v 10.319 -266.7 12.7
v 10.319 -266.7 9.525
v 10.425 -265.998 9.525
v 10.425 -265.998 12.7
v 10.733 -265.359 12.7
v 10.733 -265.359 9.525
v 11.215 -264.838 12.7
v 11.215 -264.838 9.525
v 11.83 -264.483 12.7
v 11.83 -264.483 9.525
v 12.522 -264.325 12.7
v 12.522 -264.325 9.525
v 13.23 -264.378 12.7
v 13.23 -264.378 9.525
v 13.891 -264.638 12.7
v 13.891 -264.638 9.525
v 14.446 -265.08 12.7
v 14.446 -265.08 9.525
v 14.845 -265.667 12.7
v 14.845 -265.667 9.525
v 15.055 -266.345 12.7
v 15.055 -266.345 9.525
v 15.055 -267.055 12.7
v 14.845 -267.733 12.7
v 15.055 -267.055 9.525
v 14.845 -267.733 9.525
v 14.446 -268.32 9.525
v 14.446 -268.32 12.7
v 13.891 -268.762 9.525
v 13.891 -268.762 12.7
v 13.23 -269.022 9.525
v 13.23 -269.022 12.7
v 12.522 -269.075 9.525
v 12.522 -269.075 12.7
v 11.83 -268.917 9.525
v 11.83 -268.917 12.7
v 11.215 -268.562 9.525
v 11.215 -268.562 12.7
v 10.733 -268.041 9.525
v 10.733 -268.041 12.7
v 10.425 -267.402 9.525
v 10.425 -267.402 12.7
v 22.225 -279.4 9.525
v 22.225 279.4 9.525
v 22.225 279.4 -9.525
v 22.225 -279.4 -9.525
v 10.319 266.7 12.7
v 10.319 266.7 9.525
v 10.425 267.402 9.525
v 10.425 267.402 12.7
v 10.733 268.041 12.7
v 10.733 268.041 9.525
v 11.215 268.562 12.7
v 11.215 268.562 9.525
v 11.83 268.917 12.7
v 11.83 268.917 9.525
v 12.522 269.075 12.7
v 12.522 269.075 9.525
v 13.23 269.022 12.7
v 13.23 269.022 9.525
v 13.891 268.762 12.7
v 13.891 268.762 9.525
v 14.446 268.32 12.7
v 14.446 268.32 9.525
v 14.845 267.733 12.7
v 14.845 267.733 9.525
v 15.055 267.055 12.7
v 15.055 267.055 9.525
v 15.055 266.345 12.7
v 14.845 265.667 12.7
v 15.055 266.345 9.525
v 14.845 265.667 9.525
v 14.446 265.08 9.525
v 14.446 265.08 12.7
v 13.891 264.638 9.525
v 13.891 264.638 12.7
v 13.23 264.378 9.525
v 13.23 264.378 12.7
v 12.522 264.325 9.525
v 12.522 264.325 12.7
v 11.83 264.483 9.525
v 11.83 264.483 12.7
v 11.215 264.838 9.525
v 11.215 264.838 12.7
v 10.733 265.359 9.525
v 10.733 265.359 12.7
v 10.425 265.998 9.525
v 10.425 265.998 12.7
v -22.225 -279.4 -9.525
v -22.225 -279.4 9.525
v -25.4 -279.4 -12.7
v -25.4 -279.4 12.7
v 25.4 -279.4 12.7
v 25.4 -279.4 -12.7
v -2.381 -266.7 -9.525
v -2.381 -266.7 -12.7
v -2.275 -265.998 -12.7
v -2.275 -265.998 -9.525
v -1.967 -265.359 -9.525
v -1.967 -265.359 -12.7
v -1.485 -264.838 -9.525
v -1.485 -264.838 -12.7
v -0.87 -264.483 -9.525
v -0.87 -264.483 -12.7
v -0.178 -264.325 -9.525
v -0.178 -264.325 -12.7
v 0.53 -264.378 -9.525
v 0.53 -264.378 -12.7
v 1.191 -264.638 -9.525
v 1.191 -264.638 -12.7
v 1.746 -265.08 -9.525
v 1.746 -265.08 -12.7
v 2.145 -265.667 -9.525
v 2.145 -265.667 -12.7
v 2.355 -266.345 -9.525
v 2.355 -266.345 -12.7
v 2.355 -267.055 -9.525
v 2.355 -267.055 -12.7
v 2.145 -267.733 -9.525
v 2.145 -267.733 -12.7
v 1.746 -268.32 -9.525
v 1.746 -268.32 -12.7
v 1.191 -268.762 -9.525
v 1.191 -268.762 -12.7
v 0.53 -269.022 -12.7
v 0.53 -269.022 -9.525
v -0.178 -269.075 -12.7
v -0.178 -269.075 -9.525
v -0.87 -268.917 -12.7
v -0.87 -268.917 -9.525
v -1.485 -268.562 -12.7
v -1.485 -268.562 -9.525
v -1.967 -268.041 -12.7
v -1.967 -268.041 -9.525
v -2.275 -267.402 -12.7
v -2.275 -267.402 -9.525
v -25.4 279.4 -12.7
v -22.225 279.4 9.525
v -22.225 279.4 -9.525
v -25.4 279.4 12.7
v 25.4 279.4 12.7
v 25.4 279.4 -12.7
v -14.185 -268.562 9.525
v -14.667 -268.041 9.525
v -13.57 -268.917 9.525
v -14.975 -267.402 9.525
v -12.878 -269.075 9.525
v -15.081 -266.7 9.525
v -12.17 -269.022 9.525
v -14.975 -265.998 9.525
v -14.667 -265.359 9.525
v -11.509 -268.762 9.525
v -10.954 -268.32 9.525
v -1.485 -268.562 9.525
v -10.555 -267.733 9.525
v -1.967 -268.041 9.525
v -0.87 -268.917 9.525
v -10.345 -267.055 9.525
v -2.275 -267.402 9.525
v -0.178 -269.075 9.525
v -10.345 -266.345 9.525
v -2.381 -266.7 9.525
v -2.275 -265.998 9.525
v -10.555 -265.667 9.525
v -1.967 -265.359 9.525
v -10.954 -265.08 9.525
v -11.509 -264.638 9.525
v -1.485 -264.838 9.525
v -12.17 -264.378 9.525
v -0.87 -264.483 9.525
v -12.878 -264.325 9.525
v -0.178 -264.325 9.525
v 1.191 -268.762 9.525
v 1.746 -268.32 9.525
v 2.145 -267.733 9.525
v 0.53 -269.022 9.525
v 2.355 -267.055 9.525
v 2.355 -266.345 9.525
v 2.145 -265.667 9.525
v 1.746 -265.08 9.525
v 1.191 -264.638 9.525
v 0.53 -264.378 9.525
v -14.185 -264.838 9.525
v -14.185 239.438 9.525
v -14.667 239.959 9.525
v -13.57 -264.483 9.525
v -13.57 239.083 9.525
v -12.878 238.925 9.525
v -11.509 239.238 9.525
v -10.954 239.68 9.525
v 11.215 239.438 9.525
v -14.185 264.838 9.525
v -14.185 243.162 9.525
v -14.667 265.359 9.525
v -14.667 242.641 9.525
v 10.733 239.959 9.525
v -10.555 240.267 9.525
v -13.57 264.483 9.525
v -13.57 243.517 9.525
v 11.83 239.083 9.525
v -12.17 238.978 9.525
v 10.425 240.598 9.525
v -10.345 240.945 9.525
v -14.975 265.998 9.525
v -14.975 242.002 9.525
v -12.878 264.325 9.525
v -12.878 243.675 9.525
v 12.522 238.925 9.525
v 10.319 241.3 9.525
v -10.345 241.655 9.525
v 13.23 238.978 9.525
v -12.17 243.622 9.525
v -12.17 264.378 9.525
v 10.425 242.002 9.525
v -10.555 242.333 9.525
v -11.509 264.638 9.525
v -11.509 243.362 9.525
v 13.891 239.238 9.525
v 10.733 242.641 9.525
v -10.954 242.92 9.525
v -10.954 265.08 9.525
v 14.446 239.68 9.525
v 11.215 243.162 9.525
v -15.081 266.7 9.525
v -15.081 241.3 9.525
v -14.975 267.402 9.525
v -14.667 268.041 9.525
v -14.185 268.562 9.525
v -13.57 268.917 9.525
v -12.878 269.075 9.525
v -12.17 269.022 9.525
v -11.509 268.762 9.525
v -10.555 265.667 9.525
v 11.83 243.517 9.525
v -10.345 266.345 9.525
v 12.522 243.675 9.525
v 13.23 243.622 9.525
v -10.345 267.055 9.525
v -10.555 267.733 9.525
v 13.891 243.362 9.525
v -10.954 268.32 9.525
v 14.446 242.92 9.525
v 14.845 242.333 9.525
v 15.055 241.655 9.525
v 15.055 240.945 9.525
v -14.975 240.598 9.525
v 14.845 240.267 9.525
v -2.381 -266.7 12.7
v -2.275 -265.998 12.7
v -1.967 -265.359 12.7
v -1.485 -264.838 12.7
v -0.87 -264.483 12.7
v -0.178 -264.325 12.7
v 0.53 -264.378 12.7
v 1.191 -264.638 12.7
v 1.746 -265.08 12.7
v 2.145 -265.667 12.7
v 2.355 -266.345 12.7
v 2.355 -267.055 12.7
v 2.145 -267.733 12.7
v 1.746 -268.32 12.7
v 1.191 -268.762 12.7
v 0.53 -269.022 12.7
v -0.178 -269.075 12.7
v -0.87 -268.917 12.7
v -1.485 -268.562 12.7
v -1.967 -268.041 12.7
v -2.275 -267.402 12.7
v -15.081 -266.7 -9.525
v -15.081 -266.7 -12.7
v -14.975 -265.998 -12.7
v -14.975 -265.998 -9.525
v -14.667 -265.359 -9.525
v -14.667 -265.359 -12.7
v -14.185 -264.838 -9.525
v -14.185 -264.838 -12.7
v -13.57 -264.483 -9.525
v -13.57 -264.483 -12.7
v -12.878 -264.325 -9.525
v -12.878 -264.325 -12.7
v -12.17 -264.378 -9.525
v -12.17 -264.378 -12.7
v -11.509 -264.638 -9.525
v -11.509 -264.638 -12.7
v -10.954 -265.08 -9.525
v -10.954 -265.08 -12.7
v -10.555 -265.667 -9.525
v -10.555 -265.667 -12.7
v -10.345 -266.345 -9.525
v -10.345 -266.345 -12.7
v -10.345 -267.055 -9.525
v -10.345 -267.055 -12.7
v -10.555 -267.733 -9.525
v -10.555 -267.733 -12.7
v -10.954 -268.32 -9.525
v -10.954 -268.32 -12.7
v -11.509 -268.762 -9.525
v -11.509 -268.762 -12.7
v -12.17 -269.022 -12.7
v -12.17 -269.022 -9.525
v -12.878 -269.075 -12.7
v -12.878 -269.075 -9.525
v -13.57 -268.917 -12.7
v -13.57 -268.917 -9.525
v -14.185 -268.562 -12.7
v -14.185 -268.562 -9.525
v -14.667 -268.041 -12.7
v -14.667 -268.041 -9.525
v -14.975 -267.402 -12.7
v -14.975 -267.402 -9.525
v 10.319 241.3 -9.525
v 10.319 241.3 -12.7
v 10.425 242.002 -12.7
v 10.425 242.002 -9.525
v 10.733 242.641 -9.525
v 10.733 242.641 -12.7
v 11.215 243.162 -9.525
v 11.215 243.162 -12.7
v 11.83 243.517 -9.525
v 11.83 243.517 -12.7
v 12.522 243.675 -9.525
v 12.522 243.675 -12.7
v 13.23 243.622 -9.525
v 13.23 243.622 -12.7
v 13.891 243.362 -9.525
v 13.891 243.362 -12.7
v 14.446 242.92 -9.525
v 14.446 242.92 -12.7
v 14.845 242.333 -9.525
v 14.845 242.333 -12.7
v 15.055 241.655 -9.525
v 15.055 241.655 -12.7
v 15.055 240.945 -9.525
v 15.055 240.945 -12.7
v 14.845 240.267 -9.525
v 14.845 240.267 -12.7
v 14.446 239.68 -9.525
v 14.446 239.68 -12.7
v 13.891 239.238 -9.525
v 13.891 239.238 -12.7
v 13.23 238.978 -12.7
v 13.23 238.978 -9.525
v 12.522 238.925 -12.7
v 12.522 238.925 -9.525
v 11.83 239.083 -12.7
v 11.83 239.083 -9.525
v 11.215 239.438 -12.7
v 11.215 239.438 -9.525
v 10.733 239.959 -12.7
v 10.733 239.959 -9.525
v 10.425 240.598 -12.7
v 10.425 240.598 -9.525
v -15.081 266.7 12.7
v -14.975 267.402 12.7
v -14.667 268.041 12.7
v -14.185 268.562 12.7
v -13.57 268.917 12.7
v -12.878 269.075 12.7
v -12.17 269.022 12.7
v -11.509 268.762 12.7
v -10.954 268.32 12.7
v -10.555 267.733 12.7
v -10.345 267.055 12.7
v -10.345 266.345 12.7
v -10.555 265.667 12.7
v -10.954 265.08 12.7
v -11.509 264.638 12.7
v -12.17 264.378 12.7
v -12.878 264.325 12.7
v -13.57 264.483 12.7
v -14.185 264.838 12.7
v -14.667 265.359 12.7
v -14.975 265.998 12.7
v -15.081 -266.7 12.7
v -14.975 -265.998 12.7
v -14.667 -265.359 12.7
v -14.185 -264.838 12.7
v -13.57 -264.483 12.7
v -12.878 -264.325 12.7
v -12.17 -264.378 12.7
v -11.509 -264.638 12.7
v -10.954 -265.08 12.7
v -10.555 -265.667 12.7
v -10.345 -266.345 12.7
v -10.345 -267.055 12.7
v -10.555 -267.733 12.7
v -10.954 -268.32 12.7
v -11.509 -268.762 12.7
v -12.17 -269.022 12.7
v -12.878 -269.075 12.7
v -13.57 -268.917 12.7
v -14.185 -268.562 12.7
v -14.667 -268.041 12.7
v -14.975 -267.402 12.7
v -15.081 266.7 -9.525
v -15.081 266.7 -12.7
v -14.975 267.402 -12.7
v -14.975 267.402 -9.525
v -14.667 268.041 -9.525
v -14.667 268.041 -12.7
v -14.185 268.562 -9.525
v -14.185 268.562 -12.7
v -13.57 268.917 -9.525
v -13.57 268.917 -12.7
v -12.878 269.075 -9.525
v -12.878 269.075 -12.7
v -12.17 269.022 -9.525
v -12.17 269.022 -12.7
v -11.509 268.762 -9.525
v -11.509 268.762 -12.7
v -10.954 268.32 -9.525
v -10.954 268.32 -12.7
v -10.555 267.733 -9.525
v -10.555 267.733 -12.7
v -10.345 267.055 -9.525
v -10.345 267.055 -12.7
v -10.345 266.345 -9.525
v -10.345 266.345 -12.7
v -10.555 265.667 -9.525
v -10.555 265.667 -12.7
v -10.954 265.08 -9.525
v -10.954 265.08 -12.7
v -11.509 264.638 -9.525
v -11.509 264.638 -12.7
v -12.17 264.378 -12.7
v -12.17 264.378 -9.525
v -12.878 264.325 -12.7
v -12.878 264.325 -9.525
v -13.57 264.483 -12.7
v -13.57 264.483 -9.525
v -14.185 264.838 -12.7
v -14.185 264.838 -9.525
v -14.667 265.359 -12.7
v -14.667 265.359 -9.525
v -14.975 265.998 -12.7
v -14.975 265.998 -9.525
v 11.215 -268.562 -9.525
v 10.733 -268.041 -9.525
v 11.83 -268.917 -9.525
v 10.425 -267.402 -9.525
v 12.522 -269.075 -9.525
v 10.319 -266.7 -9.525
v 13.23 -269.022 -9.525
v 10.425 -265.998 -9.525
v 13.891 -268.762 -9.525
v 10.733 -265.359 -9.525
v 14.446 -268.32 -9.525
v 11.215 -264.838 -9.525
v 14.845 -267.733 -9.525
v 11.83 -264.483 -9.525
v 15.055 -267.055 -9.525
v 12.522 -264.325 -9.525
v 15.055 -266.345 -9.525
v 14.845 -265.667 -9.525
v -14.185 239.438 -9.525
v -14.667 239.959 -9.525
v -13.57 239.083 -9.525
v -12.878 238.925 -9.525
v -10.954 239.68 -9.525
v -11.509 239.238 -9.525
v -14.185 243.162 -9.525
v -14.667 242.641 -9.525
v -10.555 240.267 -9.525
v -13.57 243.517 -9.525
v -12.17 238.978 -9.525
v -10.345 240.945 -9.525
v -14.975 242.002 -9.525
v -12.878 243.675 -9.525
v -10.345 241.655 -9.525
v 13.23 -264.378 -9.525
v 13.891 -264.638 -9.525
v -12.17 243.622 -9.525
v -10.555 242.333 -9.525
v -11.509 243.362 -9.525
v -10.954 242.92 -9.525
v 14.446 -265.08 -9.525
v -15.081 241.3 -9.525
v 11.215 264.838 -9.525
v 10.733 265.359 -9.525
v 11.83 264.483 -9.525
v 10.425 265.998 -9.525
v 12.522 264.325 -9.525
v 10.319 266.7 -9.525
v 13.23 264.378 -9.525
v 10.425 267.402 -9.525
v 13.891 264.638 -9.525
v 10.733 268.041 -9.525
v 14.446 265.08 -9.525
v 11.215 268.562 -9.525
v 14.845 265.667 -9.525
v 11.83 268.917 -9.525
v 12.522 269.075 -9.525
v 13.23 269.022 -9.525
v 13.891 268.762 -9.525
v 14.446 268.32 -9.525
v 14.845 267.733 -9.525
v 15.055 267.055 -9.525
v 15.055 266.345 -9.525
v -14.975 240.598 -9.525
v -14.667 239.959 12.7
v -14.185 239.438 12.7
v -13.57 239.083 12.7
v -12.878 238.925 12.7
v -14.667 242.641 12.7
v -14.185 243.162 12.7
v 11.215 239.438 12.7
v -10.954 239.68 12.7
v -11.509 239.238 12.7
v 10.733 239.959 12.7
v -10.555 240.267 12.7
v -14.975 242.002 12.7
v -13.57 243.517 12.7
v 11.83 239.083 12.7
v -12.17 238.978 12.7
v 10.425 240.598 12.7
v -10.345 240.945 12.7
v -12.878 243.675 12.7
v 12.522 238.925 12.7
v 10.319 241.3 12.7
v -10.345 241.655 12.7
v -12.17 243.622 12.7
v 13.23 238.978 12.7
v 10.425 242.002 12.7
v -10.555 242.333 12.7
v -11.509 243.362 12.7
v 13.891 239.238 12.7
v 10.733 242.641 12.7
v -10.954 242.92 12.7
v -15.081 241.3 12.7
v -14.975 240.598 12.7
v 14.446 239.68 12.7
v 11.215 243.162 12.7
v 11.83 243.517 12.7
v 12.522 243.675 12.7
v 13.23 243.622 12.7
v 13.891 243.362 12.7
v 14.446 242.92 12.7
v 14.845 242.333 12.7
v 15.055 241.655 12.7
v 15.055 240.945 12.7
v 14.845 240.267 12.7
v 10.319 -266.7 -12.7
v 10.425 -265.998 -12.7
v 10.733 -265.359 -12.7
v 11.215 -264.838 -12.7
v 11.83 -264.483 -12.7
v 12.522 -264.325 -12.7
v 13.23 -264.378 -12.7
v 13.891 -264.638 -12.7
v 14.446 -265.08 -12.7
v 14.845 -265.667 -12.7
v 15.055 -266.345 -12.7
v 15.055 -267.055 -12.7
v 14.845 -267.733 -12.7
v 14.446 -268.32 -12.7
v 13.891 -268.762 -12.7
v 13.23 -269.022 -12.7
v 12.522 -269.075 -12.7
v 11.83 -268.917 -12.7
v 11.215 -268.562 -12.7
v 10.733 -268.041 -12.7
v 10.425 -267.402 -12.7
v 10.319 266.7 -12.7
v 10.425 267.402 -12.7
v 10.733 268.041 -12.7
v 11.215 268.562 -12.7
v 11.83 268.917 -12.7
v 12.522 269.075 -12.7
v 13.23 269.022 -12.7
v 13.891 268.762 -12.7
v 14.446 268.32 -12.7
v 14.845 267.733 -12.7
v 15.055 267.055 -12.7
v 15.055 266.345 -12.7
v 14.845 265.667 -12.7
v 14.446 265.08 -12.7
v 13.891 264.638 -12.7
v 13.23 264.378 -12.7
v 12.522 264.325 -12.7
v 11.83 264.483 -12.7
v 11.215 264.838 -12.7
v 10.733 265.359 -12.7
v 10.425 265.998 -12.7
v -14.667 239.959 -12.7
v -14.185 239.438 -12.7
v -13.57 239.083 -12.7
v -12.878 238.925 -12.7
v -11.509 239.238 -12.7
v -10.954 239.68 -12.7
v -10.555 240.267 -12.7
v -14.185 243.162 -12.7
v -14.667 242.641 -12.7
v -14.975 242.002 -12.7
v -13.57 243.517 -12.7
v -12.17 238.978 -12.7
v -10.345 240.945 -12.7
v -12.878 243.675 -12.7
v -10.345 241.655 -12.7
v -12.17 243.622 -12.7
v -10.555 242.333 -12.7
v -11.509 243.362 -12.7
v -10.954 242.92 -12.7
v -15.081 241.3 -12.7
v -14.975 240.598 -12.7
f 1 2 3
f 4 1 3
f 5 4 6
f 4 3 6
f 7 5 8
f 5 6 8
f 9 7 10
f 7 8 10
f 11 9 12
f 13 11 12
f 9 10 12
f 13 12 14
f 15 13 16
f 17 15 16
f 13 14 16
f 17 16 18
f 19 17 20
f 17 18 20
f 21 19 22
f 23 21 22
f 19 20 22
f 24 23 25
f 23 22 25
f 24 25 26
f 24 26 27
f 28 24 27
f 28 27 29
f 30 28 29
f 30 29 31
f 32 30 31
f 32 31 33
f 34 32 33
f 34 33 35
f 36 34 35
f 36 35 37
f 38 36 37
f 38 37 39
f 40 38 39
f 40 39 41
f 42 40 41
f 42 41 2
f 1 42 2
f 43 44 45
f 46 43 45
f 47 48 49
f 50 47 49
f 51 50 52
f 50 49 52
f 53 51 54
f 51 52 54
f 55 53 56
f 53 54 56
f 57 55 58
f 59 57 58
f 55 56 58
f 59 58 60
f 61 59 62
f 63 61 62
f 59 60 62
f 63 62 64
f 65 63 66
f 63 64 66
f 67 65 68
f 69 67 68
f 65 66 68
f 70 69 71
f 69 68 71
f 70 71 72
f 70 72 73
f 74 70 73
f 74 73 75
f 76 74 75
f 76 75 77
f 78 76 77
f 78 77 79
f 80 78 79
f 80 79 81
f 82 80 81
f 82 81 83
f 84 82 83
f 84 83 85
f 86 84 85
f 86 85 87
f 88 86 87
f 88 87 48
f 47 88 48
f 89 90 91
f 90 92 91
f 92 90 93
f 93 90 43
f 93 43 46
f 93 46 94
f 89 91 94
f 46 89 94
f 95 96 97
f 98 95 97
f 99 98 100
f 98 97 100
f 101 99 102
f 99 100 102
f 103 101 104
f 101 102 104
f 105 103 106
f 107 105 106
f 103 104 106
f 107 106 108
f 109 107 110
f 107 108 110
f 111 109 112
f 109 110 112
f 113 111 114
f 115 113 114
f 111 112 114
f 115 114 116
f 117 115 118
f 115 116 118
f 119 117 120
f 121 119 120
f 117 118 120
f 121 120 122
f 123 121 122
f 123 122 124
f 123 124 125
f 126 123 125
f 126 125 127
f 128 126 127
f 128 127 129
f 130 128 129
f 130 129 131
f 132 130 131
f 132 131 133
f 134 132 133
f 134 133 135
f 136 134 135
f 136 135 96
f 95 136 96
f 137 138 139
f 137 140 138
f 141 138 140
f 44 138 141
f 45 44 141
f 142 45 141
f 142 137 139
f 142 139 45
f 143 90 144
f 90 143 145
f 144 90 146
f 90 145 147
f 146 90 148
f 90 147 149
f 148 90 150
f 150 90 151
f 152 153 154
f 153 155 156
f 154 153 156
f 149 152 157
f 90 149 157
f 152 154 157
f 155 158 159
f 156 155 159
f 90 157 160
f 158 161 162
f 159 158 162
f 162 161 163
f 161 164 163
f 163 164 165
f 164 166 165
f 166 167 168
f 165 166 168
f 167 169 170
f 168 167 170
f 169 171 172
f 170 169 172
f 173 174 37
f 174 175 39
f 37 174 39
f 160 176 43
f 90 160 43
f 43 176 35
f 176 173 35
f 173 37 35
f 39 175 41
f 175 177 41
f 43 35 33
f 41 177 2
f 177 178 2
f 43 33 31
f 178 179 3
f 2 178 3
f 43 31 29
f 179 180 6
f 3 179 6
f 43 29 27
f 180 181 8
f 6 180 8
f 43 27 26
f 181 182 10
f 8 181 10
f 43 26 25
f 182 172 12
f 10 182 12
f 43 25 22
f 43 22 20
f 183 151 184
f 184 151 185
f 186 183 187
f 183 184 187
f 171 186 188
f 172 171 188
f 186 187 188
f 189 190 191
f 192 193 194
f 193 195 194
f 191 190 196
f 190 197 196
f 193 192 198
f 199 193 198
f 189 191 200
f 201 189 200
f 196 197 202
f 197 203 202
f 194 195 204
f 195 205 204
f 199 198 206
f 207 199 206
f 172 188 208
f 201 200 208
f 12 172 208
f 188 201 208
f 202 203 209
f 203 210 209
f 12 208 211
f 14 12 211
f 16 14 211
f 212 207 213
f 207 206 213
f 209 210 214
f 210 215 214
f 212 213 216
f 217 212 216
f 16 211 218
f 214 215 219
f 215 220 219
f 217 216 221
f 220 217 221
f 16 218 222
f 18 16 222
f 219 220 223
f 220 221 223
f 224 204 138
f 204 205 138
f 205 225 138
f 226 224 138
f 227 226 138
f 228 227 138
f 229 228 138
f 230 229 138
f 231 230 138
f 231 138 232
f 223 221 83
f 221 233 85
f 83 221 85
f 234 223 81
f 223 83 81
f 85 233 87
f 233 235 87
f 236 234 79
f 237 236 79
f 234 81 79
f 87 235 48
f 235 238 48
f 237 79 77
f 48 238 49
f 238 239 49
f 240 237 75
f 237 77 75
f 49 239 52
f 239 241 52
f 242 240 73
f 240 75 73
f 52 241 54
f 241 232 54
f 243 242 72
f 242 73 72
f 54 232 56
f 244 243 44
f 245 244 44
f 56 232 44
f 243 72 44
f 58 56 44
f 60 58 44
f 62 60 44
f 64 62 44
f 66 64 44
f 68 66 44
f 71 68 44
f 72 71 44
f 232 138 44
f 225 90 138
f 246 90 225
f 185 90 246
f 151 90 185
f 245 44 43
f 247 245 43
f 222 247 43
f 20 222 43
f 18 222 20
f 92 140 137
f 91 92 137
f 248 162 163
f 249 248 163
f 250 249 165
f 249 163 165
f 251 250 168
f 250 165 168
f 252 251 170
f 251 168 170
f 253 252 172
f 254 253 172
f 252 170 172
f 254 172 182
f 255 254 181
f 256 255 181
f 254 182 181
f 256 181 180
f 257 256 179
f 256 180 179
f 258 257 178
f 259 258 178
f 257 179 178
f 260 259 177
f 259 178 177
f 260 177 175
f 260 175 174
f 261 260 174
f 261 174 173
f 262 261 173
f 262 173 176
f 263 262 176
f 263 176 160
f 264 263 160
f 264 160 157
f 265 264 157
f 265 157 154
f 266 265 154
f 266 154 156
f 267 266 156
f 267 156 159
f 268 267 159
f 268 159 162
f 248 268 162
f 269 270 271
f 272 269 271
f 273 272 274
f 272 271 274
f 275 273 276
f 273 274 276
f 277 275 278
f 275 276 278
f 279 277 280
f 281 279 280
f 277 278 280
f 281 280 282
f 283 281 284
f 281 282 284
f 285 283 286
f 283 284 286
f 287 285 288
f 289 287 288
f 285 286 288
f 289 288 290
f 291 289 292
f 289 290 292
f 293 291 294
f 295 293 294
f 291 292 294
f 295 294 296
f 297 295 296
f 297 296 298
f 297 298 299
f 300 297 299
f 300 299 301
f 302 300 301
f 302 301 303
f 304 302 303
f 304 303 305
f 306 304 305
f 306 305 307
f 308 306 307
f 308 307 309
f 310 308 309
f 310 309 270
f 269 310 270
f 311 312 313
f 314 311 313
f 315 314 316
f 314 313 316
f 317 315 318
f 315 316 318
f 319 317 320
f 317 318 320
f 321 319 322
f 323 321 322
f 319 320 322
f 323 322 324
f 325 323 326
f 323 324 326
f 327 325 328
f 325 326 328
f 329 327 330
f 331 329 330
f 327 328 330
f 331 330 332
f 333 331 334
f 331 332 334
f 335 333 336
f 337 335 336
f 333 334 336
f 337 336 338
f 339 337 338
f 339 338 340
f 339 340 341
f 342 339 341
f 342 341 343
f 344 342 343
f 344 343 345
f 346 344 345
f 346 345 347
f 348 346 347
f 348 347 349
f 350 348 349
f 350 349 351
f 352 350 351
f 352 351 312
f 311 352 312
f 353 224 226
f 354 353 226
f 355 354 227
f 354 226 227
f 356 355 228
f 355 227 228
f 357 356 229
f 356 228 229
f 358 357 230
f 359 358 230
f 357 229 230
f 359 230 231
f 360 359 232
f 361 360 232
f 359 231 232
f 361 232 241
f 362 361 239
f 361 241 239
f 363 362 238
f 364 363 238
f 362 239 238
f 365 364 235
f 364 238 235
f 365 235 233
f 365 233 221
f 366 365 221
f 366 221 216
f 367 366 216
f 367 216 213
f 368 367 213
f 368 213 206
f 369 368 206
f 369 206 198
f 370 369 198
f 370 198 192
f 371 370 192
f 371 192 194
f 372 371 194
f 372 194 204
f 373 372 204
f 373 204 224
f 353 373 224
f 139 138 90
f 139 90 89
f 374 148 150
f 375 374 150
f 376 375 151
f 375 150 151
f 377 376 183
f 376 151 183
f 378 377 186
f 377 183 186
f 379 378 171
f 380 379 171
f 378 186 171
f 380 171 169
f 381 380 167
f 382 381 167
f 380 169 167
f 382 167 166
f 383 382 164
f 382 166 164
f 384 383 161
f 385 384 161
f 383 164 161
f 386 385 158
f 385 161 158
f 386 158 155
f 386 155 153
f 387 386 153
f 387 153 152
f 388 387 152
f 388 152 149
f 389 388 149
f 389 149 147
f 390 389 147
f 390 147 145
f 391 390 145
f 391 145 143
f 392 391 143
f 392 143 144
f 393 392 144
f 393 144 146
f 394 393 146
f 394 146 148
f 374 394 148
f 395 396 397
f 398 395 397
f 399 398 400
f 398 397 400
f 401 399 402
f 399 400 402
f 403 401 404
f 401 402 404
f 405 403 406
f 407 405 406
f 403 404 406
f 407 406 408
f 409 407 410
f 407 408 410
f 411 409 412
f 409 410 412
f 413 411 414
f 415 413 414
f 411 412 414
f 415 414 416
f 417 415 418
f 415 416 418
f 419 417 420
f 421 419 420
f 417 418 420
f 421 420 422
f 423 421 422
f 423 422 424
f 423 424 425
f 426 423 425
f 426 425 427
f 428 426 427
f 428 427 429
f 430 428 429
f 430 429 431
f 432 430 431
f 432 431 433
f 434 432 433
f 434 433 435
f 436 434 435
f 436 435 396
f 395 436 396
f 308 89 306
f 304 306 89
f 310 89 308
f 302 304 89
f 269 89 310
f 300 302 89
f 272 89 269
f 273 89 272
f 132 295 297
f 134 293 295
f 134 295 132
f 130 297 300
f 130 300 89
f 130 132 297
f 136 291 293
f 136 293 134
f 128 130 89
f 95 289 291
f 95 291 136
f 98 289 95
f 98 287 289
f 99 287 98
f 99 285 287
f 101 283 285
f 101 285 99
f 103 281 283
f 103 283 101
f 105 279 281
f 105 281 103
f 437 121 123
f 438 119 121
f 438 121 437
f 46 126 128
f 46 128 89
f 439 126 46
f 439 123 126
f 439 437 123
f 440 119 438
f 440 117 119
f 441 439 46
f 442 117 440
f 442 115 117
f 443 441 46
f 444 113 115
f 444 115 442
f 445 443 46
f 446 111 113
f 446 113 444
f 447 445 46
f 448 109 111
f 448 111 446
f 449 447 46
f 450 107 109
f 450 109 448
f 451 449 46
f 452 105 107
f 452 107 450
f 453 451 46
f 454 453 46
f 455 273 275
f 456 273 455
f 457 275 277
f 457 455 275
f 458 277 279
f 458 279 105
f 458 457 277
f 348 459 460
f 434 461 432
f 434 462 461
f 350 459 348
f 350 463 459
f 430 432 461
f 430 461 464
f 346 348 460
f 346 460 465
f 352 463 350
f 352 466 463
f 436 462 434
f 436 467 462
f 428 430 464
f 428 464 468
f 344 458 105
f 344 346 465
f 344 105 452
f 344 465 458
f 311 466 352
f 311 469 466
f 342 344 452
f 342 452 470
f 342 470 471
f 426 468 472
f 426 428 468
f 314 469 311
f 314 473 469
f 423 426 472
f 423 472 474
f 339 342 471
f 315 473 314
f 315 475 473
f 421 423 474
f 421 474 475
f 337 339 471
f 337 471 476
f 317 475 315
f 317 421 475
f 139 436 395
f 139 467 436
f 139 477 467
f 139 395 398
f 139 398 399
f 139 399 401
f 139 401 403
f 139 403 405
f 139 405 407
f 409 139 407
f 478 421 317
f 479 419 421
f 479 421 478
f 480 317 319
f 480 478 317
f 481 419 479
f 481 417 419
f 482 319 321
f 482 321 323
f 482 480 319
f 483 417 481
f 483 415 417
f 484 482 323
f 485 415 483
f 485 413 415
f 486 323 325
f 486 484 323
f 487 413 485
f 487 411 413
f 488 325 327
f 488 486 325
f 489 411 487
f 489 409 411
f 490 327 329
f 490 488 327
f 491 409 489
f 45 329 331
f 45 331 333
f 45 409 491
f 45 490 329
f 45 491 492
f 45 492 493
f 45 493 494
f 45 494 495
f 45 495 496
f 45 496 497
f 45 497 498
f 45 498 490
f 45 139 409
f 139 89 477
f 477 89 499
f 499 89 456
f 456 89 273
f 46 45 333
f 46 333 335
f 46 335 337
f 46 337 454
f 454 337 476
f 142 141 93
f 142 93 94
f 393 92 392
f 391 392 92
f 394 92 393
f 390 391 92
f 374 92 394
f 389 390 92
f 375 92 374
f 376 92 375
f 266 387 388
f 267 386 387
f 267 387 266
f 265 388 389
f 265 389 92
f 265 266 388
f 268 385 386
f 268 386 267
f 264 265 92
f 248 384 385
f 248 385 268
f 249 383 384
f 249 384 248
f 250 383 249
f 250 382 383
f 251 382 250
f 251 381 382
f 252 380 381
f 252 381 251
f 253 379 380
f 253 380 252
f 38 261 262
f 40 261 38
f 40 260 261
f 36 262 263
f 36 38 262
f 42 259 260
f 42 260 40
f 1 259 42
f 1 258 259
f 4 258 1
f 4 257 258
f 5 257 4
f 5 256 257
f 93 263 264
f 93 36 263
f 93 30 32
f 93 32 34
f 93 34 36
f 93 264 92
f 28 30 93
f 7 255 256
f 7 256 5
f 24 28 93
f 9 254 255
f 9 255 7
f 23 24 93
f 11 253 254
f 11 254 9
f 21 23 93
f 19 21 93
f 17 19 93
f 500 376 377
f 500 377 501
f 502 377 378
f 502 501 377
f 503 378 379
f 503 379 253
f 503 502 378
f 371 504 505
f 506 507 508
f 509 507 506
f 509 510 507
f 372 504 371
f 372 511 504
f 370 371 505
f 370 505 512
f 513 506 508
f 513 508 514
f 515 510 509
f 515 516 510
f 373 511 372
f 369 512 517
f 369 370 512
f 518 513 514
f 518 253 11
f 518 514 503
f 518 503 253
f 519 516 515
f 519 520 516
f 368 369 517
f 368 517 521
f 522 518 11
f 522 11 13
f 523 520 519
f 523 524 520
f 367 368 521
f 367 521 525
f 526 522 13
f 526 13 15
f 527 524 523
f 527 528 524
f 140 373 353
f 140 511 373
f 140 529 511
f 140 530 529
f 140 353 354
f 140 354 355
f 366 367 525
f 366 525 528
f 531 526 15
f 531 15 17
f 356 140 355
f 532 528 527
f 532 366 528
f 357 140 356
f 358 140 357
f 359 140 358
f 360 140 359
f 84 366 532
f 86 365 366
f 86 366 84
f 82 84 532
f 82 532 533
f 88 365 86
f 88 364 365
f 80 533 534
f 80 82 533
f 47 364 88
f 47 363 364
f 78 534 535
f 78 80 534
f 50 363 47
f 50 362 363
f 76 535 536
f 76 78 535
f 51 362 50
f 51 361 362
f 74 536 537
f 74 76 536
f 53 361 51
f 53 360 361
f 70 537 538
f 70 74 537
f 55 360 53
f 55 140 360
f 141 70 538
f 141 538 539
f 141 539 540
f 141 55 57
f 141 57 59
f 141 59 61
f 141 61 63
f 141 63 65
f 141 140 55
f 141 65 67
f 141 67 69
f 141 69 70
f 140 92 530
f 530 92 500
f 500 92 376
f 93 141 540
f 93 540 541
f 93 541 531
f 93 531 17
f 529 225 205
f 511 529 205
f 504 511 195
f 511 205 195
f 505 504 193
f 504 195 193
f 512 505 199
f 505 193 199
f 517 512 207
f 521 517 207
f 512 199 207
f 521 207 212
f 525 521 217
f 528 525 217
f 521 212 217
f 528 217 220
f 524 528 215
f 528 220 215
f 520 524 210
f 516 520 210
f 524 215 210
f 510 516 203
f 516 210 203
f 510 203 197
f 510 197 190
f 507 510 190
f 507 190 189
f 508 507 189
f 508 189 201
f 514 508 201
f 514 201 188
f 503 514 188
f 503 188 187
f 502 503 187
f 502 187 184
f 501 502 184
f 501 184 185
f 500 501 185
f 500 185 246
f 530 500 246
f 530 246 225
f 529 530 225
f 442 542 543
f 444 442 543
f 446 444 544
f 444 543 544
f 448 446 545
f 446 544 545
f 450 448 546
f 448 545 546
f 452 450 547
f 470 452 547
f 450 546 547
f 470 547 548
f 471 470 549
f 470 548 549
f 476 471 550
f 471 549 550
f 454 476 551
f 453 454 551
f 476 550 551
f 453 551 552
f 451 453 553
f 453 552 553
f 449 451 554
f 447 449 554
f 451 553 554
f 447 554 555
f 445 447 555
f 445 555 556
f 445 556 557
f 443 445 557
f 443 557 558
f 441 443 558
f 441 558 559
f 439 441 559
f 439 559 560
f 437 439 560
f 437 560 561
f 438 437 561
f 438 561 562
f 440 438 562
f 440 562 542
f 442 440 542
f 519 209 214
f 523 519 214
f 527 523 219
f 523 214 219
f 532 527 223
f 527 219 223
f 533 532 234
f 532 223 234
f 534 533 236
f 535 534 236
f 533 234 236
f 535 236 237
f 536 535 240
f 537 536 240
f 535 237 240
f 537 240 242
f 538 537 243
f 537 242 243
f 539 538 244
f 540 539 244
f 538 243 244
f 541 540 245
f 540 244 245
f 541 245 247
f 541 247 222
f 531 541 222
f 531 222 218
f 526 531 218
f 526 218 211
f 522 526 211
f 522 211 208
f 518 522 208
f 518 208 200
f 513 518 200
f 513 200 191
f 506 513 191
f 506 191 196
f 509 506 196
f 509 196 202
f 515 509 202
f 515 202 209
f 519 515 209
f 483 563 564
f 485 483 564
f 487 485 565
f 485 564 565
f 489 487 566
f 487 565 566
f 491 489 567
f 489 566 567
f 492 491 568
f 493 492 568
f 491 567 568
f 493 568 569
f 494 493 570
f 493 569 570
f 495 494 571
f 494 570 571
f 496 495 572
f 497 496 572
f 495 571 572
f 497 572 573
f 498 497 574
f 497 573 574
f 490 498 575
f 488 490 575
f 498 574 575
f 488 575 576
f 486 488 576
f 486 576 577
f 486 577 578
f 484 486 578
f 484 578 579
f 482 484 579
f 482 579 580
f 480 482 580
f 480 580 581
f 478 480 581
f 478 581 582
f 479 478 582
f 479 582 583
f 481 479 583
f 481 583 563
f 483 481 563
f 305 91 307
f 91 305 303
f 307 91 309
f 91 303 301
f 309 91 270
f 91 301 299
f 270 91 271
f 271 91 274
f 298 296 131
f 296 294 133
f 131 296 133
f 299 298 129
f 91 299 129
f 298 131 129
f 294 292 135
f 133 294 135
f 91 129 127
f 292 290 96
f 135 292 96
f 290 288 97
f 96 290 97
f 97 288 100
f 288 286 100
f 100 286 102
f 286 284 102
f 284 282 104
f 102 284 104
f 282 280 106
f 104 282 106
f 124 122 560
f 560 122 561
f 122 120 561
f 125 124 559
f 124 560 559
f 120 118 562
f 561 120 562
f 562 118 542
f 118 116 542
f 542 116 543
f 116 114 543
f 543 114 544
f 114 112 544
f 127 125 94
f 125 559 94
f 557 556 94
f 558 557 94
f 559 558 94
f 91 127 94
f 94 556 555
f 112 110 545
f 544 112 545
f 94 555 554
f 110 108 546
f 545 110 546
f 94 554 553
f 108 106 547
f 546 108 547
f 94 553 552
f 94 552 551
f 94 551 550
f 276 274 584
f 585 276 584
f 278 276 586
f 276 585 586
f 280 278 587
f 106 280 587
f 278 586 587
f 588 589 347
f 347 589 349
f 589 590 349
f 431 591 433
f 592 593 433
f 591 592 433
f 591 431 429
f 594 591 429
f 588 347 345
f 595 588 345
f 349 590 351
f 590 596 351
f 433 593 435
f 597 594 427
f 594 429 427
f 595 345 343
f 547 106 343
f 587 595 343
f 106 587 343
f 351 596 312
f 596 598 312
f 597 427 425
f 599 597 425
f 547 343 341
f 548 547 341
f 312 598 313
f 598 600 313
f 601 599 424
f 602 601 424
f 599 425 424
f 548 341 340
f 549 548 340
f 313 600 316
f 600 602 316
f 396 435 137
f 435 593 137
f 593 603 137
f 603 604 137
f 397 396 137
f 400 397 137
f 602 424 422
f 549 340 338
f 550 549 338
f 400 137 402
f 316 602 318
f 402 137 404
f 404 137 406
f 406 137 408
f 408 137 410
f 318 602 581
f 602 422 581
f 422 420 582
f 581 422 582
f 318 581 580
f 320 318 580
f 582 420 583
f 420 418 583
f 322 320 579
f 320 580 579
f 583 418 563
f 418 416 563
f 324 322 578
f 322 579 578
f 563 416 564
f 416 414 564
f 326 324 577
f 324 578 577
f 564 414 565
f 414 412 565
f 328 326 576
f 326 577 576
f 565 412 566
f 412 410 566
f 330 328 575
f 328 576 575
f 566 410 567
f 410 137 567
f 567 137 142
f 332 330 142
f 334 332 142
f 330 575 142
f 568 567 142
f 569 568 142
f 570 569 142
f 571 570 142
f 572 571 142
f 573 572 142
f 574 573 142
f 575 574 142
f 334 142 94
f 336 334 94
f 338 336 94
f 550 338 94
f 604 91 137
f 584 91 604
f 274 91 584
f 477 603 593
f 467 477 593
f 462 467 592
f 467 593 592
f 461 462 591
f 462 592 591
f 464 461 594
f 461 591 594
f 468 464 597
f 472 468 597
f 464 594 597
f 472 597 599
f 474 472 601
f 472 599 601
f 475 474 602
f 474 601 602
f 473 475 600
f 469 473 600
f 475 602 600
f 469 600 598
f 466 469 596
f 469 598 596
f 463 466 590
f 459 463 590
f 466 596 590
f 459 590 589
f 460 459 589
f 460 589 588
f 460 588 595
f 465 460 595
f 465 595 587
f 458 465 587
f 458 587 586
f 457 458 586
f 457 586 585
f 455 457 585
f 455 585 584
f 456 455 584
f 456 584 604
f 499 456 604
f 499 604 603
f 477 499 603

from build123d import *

# Parameters (mm, degrees)
SKETCH1_W           = 50.8
SKETCH1_H           = 25.4
BOSS_EXTRUDE1_DEPTH = 279.4
SHELL1_T            = -3.175
SKETCH2_R           = 2.38125
CUT_EXTRUDE1_DEPTH  = 282.699627263


with BuildPart() as part:
    # Sketch1 → Boss-Extrude1 (new, symmetric)
    with BuildSketch(Plane(origin=(0, 0, 0), x_dir=(1, 0, 0), z_dir=(0, 1, 0))):
        Rectangle(SKETCH1_W, SKETCH1_H)
    extrude(amount=BOSS_EXTRUDE1_DEPTH, both=True)

    # Shell1
    shell1_openings = [part.faces().sort_by_distance(p)[0] for p in [
        (0, 279.4, 0),
        (0, -279.4, 0),
    ]]
    offset(amount=SHELL1_T, openings=shell1_openings, kind=Kind.INTERSECTION)

    # Sketch2 → Cut-Extrude1 (cut, through all)
    with BuildSketch(Plane(origin=(0, 0, -12.7), x_dir=(-1, 0, 0), z_dir=(0, 0, -1))):
        with Locations((-12.7, -266.7)):
            Circle(SKETCH2_R)
        with Locations((0, -266.7)):
            Circle(SKETCH2_R)
        with Locations((12.7, -266.7)):
            Circle(SKETCH2_R)
        with Locations((-12.7, 266.7)):
            Circle(SKETCH2_R)
        with Locations((-12.7, 241.3)):
            Circle(SKETCH2_R)
        with Locations((12.7, 241.3)):
            Circle(SKETCH2_R)
        with Locations((12.7, 266.7)):
            Circle(SKETCH2_R)
    extrude(amount=-CUT_EXTRUDE1_DEPTH, mode=Mode.SUBTRACT)


solid = part.part
